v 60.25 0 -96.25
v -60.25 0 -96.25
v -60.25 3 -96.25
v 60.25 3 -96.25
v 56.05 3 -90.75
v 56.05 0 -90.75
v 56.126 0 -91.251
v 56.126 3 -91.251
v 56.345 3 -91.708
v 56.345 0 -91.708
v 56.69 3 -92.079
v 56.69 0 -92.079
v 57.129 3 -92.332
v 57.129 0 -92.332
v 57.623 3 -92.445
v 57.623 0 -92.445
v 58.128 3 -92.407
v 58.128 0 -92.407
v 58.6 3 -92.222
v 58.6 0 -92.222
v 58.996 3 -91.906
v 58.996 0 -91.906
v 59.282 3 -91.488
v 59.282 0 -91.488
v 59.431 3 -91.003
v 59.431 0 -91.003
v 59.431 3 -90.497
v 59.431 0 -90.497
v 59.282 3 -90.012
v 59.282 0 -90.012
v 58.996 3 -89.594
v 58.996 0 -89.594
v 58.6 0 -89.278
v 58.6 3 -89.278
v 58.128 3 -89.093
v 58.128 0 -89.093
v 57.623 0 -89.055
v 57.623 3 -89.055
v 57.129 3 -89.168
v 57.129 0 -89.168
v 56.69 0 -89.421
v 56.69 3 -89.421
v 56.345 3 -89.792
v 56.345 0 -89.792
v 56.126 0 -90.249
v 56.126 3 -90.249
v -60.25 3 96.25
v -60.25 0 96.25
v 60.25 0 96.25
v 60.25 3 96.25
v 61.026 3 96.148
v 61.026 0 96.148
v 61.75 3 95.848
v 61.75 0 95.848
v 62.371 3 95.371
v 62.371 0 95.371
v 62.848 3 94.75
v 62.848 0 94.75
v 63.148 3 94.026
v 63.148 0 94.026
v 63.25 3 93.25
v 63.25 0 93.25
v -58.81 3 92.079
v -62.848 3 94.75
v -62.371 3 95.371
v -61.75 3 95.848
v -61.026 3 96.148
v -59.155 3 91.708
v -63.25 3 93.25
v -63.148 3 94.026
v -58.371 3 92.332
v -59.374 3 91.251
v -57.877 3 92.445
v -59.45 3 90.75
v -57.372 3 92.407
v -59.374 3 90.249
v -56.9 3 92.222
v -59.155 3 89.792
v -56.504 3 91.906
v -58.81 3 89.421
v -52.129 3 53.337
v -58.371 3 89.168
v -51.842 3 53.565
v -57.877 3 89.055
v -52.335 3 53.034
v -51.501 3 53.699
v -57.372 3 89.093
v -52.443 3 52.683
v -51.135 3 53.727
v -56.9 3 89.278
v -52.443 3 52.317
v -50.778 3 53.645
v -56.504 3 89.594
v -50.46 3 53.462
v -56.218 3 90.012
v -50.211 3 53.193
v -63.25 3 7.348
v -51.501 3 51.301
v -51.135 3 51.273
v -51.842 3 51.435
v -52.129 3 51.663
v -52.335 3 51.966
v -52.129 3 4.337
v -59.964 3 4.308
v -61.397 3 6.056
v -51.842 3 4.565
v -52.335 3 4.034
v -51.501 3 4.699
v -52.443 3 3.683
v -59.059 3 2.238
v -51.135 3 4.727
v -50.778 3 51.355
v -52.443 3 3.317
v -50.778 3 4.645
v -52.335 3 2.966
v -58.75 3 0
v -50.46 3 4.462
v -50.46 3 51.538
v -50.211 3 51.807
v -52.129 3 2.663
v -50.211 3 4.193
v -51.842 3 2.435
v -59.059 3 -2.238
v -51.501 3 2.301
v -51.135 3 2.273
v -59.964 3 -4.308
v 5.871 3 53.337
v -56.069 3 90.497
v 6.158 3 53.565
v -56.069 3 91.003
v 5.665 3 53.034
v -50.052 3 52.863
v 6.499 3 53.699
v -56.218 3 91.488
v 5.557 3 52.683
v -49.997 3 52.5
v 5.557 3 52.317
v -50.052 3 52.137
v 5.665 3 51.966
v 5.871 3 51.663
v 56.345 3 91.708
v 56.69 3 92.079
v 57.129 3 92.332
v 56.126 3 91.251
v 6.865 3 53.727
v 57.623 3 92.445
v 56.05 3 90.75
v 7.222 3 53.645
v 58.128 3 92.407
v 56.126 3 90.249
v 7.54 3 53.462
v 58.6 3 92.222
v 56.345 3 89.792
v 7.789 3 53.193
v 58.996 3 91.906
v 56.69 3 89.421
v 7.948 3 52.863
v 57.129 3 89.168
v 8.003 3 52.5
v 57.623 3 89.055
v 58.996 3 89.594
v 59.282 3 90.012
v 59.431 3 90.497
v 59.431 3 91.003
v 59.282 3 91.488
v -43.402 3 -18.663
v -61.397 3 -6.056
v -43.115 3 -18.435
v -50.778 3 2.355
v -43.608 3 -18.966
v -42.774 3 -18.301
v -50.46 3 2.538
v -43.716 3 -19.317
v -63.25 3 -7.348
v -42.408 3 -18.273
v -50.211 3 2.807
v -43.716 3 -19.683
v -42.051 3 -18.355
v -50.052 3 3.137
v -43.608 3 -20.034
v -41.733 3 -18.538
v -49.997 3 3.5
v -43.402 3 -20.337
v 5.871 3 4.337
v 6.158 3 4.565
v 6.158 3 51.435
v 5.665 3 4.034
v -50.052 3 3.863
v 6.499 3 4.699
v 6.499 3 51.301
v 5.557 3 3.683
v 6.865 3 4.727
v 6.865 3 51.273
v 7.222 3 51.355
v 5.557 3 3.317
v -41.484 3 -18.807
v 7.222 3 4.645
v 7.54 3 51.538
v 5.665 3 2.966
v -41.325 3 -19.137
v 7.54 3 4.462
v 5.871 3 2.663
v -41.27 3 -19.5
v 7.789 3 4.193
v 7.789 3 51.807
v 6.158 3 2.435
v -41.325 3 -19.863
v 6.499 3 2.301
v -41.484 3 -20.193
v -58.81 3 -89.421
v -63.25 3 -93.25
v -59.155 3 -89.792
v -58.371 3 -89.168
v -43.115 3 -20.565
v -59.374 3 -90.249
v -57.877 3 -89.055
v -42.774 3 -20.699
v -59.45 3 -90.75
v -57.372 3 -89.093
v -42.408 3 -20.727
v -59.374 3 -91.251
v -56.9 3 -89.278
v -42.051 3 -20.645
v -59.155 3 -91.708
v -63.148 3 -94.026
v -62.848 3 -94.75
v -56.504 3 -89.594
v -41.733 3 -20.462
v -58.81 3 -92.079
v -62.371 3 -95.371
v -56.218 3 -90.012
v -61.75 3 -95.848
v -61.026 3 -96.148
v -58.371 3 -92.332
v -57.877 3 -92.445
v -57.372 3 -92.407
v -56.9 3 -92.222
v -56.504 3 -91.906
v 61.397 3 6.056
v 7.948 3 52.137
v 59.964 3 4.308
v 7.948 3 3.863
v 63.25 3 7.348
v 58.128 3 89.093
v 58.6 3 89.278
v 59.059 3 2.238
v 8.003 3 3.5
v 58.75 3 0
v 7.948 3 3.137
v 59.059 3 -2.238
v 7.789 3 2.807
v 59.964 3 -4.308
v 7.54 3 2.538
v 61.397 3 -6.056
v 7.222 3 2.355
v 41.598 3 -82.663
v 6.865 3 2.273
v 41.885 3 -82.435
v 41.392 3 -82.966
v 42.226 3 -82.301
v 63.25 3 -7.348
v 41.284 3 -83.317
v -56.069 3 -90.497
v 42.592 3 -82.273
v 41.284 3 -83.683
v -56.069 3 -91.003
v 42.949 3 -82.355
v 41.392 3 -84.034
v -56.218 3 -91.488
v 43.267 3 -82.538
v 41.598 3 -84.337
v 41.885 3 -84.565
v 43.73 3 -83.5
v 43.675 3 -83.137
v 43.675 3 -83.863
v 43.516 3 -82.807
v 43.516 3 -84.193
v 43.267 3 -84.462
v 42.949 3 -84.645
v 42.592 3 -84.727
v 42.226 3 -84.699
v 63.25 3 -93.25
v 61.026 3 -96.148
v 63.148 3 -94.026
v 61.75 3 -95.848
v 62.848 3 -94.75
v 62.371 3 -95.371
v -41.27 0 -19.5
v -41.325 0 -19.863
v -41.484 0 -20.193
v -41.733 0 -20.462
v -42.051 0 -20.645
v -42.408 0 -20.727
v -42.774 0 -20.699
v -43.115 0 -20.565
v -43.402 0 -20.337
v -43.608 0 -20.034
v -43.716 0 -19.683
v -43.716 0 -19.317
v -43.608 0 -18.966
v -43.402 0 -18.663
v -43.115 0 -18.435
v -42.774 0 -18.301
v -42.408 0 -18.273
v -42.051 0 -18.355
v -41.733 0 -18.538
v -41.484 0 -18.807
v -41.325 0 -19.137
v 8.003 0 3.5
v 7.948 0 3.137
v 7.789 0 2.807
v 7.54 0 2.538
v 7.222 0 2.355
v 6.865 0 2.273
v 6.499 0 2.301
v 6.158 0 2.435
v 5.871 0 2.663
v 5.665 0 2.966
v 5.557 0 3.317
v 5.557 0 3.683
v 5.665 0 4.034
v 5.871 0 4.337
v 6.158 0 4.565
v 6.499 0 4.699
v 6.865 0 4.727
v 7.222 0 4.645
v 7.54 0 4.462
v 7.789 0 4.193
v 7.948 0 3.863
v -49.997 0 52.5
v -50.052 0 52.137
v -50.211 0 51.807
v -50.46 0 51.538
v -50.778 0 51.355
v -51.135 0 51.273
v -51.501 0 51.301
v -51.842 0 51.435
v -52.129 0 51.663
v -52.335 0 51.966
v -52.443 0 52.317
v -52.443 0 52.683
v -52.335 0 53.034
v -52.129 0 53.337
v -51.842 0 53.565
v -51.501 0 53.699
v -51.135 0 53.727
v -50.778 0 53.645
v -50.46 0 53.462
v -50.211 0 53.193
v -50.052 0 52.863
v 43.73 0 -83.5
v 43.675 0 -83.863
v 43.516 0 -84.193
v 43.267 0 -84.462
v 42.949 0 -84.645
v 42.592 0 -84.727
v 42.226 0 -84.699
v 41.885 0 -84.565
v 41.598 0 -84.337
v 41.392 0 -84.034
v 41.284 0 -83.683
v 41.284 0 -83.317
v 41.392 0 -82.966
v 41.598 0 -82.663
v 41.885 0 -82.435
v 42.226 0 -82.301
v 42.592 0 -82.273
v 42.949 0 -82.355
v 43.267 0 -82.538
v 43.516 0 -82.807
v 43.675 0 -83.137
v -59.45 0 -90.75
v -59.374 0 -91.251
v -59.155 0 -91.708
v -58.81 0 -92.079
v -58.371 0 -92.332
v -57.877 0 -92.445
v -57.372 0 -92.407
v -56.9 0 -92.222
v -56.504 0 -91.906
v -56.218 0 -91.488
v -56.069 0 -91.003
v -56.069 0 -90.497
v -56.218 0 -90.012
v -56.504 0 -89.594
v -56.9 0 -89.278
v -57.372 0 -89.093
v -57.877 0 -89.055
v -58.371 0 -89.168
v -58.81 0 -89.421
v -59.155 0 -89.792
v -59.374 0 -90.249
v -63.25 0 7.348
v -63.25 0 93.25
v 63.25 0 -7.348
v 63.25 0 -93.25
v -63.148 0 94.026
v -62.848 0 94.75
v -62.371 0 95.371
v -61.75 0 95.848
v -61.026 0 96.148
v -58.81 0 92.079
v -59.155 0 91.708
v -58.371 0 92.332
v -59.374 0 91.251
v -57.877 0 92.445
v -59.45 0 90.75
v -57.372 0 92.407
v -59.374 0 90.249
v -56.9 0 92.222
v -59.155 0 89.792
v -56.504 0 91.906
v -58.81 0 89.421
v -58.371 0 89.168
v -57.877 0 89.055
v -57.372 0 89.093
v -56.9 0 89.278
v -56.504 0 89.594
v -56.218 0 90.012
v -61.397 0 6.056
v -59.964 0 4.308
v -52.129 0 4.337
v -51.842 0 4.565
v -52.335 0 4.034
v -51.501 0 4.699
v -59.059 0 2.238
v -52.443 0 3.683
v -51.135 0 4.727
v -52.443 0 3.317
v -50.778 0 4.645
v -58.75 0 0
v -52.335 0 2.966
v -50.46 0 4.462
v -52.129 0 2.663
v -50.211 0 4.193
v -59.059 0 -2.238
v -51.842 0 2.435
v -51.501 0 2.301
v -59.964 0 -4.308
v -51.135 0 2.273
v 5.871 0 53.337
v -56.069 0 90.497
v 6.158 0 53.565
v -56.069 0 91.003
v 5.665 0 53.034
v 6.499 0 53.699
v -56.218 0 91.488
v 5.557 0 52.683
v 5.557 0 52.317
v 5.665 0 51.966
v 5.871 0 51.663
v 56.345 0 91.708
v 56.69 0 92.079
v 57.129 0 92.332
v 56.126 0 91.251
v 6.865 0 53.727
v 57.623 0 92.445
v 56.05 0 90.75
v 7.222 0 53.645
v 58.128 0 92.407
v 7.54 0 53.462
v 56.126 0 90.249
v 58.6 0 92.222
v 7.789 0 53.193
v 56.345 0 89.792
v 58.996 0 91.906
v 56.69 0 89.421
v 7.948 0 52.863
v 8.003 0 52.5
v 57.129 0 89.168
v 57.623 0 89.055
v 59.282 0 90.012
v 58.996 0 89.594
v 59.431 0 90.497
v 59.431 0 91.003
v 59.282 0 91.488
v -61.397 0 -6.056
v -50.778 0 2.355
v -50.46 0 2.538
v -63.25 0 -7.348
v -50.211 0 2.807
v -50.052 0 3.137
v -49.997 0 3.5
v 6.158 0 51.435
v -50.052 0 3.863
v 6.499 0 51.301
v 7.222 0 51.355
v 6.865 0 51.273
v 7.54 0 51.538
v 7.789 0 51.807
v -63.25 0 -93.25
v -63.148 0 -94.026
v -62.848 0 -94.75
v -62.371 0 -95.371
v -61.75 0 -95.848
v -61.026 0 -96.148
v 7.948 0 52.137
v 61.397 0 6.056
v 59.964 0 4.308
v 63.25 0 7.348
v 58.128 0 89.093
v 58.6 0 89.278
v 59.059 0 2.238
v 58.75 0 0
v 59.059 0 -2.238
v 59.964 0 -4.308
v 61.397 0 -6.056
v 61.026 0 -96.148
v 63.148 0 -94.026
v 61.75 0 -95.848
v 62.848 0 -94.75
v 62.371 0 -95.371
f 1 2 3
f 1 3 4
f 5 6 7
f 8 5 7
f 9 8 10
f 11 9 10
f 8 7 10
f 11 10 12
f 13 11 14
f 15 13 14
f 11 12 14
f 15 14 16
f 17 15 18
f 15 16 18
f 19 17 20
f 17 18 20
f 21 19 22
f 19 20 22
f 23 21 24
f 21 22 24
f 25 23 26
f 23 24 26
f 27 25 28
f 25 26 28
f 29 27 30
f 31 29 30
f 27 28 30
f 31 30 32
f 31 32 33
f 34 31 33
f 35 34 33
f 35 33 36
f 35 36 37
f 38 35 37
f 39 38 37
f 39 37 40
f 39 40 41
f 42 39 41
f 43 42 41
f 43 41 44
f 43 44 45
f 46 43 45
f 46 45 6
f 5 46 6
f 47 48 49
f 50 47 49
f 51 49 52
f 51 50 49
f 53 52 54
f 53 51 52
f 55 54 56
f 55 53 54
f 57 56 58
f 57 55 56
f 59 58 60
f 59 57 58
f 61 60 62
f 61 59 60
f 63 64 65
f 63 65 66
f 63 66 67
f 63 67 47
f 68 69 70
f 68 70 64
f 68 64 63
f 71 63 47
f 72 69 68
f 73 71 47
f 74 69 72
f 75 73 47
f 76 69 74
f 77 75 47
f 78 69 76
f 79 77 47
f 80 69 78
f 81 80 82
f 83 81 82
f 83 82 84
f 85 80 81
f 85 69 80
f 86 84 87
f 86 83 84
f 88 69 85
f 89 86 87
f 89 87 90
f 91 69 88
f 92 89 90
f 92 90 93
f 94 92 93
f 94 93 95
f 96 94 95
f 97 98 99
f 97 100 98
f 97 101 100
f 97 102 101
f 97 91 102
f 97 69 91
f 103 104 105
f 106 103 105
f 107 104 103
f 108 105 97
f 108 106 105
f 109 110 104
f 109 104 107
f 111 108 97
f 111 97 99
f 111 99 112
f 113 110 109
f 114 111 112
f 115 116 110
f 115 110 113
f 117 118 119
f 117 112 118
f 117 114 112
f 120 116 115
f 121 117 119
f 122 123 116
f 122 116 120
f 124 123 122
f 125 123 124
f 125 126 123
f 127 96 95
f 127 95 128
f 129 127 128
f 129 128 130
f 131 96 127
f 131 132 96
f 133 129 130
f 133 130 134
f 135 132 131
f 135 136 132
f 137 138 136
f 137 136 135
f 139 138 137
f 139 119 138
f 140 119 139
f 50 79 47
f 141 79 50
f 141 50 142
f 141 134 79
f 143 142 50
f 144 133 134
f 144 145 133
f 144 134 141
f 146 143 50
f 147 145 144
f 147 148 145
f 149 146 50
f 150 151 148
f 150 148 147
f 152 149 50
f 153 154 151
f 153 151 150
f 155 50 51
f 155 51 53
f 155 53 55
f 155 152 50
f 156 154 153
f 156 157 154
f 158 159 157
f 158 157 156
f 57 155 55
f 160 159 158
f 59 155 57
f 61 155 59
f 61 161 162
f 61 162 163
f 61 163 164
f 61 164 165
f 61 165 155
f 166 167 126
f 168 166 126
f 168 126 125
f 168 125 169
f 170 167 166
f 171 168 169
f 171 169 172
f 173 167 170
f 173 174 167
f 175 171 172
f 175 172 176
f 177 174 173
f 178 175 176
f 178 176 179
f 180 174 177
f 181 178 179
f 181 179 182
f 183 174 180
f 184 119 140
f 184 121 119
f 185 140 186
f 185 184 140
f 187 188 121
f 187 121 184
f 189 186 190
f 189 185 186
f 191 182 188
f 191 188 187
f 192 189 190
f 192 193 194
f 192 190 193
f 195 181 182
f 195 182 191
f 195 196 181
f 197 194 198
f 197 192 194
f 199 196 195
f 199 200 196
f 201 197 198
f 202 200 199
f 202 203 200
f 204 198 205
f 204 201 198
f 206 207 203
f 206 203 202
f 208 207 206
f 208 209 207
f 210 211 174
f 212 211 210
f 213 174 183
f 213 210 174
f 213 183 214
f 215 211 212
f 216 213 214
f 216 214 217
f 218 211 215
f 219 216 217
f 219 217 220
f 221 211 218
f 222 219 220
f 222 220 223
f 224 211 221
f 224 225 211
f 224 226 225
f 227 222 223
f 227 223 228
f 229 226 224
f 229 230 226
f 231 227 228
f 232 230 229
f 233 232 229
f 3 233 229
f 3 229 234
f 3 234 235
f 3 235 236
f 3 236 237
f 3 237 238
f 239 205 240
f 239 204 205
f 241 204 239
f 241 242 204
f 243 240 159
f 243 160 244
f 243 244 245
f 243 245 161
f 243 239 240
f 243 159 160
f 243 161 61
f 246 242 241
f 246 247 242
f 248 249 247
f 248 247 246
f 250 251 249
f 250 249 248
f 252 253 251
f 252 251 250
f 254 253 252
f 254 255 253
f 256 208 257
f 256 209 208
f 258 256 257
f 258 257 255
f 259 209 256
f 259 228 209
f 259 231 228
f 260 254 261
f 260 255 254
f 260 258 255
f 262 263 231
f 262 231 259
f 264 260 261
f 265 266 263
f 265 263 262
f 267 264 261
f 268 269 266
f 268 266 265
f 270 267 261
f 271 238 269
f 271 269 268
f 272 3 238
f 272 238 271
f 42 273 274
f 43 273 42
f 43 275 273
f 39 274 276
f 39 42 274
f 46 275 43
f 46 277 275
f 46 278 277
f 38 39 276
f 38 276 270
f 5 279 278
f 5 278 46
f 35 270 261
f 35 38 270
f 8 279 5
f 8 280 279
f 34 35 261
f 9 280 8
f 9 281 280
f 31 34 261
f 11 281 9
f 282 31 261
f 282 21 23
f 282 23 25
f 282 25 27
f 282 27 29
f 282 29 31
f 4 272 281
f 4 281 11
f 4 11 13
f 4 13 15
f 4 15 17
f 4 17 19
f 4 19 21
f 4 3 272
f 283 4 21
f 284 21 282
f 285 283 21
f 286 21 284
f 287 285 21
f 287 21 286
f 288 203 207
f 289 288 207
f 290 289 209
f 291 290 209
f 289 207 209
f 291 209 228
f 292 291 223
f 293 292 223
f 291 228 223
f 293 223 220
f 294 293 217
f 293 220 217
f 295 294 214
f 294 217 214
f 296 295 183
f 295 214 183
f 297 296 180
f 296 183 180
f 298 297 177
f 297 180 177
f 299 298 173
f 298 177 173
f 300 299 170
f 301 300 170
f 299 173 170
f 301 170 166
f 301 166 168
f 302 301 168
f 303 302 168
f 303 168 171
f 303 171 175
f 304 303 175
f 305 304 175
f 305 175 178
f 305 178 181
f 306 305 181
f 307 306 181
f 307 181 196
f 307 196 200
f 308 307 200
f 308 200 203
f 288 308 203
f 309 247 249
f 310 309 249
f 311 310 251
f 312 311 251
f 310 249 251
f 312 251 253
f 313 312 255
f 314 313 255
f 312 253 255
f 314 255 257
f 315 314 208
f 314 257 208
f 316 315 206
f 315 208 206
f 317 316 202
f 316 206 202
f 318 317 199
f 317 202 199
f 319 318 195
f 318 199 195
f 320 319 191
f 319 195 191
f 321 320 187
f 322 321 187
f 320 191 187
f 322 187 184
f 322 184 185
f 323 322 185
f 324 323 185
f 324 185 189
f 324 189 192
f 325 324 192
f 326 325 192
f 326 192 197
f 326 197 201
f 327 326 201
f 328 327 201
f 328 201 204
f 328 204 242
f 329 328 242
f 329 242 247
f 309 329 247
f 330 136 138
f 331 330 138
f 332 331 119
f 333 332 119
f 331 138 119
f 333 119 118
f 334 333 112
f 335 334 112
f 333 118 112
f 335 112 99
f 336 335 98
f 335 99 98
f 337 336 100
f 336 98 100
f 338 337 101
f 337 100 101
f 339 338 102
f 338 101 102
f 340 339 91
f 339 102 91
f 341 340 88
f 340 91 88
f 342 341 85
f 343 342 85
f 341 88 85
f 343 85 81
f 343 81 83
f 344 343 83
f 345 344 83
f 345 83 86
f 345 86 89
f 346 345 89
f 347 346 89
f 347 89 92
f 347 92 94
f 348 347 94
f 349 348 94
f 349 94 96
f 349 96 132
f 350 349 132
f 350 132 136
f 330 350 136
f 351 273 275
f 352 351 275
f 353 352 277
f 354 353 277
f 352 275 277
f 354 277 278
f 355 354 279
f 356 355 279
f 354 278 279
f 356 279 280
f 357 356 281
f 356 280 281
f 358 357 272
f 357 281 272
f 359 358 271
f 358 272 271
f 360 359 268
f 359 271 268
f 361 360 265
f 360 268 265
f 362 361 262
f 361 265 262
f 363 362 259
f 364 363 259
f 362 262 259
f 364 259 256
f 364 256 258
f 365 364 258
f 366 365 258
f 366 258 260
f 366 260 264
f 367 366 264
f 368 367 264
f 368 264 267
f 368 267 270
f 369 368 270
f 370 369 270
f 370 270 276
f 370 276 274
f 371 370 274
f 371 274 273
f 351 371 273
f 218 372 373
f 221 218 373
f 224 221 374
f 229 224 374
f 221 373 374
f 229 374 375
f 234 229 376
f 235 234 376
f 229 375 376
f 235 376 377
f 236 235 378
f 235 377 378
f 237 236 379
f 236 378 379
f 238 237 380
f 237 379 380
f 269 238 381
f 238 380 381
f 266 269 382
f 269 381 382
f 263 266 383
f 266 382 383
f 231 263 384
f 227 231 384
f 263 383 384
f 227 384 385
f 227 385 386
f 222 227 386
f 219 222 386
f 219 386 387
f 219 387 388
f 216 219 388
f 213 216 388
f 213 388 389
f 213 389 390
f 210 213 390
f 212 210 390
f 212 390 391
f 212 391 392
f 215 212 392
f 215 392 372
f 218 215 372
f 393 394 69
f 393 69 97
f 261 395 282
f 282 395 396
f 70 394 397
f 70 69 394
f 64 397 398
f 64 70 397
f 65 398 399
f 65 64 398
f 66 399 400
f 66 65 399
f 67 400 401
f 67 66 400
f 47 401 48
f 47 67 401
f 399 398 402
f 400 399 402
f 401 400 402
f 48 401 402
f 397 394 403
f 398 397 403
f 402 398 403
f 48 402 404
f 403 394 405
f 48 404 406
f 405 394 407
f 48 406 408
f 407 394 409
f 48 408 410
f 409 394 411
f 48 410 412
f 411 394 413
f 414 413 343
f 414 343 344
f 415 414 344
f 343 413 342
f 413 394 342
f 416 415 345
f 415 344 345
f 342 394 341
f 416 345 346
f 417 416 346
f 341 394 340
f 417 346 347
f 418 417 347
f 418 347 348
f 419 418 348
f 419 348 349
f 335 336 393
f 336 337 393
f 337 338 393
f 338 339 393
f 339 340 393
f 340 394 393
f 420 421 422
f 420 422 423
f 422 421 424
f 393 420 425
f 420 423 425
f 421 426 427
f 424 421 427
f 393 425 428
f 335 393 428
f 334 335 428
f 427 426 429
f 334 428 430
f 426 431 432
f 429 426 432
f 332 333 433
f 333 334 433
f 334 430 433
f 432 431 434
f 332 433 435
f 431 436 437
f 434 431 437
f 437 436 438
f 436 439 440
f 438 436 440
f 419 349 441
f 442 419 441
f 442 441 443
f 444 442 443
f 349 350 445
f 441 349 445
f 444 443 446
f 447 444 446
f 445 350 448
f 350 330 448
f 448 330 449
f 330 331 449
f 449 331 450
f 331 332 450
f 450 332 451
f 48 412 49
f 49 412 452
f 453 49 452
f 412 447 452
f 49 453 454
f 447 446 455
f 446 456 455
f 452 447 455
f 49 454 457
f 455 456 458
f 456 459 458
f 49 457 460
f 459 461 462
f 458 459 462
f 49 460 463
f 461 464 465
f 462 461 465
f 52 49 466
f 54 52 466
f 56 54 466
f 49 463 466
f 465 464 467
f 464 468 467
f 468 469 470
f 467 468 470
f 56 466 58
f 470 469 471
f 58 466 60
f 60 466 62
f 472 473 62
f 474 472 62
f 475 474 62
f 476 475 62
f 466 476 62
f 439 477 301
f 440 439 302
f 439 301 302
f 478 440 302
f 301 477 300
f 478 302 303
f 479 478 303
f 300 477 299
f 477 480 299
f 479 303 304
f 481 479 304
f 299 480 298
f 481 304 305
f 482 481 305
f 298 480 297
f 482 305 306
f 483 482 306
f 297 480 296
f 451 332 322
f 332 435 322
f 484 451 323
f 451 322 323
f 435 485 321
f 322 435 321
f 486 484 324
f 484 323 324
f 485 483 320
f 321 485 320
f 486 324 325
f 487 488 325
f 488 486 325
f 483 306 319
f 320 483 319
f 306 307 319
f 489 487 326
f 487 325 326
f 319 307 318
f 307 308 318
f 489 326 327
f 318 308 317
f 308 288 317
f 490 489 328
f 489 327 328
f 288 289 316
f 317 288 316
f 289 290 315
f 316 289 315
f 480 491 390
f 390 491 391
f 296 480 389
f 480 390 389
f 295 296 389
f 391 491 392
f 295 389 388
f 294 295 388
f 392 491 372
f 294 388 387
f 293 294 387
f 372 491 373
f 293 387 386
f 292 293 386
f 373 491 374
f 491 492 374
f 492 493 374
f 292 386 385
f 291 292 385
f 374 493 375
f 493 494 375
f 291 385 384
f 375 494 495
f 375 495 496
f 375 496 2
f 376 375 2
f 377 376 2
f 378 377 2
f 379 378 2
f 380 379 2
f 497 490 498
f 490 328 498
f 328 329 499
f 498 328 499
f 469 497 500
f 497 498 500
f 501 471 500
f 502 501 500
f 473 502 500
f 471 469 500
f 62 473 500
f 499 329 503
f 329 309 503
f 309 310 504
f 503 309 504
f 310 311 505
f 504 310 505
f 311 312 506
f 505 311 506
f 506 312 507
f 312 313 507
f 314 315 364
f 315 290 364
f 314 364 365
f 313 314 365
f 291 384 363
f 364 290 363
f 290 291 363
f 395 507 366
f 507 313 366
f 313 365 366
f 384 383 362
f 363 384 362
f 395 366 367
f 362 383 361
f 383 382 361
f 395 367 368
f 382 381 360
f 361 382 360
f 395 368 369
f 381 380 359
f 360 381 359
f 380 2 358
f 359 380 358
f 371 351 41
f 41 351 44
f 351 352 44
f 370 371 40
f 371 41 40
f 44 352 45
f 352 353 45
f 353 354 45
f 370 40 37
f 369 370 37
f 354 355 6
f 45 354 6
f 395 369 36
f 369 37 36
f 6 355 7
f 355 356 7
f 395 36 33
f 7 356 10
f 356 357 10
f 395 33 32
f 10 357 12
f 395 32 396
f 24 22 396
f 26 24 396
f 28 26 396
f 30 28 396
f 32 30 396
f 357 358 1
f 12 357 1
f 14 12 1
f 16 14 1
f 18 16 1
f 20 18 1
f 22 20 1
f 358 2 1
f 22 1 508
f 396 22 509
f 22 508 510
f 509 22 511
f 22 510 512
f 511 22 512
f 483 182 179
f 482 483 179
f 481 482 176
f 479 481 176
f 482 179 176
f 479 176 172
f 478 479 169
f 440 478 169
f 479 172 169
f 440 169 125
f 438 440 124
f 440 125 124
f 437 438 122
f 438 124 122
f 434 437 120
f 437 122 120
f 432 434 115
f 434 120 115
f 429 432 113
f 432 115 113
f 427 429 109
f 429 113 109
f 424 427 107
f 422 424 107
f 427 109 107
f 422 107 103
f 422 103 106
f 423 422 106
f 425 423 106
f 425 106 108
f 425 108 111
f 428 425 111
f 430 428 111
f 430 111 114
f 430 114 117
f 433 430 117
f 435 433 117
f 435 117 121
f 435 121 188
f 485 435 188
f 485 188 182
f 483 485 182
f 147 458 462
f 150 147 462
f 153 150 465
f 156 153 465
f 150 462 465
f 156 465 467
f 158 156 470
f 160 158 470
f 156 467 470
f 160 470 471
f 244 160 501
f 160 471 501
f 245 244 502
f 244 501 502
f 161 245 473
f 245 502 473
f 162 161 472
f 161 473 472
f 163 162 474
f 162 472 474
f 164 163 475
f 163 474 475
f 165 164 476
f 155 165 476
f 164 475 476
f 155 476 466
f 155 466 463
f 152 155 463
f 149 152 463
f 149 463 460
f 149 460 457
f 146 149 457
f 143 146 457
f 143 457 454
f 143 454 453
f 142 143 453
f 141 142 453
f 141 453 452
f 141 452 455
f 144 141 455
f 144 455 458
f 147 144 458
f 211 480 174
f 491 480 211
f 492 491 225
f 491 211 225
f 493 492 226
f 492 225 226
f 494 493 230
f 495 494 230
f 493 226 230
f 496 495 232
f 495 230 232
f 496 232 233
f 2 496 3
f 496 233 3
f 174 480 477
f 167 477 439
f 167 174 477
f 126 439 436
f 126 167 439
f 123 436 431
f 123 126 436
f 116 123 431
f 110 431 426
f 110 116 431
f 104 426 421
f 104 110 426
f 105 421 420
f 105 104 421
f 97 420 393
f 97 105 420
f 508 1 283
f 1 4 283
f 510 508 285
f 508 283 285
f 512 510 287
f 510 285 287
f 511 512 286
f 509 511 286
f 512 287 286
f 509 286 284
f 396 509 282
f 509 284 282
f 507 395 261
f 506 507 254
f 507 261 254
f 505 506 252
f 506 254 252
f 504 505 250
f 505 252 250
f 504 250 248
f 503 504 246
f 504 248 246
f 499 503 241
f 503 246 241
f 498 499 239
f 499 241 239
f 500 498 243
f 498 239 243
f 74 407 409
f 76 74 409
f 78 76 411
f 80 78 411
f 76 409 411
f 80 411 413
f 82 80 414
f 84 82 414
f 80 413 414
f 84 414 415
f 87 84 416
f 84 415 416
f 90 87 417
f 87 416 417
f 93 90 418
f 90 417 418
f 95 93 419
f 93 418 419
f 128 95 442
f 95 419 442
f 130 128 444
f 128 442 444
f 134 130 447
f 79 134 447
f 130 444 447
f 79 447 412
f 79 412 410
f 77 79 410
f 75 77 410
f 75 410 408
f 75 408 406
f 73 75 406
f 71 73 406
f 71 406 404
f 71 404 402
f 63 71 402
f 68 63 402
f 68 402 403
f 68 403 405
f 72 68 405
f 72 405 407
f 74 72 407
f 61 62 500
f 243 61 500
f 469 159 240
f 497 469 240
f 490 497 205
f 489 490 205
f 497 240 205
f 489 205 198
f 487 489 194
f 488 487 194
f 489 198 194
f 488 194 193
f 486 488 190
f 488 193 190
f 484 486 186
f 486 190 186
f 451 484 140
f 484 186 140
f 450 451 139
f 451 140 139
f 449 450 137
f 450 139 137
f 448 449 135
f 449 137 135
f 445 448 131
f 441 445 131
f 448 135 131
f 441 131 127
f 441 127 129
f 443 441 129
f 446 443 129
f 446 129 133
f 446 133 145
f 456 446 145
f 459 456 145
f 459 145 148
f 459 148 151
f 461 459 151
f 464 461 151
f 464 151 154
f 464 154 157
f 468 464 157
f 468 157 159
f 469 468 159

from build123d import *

# Parameters (mm, degrees)
SKETCH1_W            = 126.5
SKETCH1_H            = 192.5
BOSS_EXTRUDE1_DEPTH  = 3
CUT_EXTRUDE1_REACH   = 117.211
SKETCH2_R            = 8.25
M3_CLEARANCE_HOLE1_D = 3.4
FILLET1_R            = 3
M3_TAPPED_HOLE1_D    = 2.46


with BuildPart() as part:
    # Sketch1 → Boss-Extrude1 (new body)
    with BuildSketch(Plane(origin=(0, 0, 0), x_dir=(1, 0, 0), z_dir=(0, 1, 0))):
        Rectangle(SKETCH1_W, SKETCH1_H)
    extrude(amount=BOSS_EXTRUDE1_DEPTH)

    # Sketch2 → Cut-Extrude1 (cut, up to next)
    with BuildSketch(Plane(origin=(0, 3, 0), x_dir=(1, 0, 0), z_dir=(0, 1, 0)), mode=Mode.PRIVATE) as cut_extrude1_sk1:
        with Locations((67, 0)):
            Circle(SKETCH2_R)
    cut_extrude1_tool1 = extrude(cut_extrude1_sk1.sketch, amount=-CUT_EXTRUDE1_REACH, mode=Mode.PRIVATE) & part.part
    cut_extrude1 = cut_extrude1_tool1.solids().sort_by_distance((67, 3, 0))[0]
    add(cut_extrude1, mode=Mode.SUBTRACT)

    # Mirror1: Cut-Extrude1 across plane
    add(cut_extrude1.mirror(Plane(origin=(0, 0, 0), x_dir=(0, 0, 1), z_dir=(1, 0, 0))), mode=Mode.SUBTRACT)

    # M3 Clearance Hole1 (through all)
    with Locations(Plane(origin=(0, 3, 0), x_dir=(1, 0, 0), z_dir=(0, 1, 0))):
        with Locations((-57.75, 90.75), (57.75, -90.75), (57.75, 90.75), (-57.75, -90.75)):
            Hole(M3_CLEARANCE_HOLE1_D / 2)

    # Fillet1
    fillet1_edges = [part.edges().sort_by_distance(p)[0] for p in [
        (63.25, 1.5, 96.25),
        (-63.25, 1.5, 96.25),
        (-63.25, 1.5, -96.25),
        (63.25, 1.5, -96.25),
    ]]
    fillet(fillet1_edges, radius=FILLET1_R)

    # M3 Tapped Hole1 (through all)
    with Locations(Plane(origin=(0, 0, 0), x_dir=(-1, 0, 0), z_dir=(0, -1, 0))):
        with Locations((-6.773037989, -52.5), (-42.49999882, 83.49999962), (42.50000136, 19.50000062), (-6.773037989, -3.5), (51.226962011, -3.5), (51.226962011, -52.5)):
            Hole(M3_TAPPED_HOLE1_D / 2)


solid = part.part
